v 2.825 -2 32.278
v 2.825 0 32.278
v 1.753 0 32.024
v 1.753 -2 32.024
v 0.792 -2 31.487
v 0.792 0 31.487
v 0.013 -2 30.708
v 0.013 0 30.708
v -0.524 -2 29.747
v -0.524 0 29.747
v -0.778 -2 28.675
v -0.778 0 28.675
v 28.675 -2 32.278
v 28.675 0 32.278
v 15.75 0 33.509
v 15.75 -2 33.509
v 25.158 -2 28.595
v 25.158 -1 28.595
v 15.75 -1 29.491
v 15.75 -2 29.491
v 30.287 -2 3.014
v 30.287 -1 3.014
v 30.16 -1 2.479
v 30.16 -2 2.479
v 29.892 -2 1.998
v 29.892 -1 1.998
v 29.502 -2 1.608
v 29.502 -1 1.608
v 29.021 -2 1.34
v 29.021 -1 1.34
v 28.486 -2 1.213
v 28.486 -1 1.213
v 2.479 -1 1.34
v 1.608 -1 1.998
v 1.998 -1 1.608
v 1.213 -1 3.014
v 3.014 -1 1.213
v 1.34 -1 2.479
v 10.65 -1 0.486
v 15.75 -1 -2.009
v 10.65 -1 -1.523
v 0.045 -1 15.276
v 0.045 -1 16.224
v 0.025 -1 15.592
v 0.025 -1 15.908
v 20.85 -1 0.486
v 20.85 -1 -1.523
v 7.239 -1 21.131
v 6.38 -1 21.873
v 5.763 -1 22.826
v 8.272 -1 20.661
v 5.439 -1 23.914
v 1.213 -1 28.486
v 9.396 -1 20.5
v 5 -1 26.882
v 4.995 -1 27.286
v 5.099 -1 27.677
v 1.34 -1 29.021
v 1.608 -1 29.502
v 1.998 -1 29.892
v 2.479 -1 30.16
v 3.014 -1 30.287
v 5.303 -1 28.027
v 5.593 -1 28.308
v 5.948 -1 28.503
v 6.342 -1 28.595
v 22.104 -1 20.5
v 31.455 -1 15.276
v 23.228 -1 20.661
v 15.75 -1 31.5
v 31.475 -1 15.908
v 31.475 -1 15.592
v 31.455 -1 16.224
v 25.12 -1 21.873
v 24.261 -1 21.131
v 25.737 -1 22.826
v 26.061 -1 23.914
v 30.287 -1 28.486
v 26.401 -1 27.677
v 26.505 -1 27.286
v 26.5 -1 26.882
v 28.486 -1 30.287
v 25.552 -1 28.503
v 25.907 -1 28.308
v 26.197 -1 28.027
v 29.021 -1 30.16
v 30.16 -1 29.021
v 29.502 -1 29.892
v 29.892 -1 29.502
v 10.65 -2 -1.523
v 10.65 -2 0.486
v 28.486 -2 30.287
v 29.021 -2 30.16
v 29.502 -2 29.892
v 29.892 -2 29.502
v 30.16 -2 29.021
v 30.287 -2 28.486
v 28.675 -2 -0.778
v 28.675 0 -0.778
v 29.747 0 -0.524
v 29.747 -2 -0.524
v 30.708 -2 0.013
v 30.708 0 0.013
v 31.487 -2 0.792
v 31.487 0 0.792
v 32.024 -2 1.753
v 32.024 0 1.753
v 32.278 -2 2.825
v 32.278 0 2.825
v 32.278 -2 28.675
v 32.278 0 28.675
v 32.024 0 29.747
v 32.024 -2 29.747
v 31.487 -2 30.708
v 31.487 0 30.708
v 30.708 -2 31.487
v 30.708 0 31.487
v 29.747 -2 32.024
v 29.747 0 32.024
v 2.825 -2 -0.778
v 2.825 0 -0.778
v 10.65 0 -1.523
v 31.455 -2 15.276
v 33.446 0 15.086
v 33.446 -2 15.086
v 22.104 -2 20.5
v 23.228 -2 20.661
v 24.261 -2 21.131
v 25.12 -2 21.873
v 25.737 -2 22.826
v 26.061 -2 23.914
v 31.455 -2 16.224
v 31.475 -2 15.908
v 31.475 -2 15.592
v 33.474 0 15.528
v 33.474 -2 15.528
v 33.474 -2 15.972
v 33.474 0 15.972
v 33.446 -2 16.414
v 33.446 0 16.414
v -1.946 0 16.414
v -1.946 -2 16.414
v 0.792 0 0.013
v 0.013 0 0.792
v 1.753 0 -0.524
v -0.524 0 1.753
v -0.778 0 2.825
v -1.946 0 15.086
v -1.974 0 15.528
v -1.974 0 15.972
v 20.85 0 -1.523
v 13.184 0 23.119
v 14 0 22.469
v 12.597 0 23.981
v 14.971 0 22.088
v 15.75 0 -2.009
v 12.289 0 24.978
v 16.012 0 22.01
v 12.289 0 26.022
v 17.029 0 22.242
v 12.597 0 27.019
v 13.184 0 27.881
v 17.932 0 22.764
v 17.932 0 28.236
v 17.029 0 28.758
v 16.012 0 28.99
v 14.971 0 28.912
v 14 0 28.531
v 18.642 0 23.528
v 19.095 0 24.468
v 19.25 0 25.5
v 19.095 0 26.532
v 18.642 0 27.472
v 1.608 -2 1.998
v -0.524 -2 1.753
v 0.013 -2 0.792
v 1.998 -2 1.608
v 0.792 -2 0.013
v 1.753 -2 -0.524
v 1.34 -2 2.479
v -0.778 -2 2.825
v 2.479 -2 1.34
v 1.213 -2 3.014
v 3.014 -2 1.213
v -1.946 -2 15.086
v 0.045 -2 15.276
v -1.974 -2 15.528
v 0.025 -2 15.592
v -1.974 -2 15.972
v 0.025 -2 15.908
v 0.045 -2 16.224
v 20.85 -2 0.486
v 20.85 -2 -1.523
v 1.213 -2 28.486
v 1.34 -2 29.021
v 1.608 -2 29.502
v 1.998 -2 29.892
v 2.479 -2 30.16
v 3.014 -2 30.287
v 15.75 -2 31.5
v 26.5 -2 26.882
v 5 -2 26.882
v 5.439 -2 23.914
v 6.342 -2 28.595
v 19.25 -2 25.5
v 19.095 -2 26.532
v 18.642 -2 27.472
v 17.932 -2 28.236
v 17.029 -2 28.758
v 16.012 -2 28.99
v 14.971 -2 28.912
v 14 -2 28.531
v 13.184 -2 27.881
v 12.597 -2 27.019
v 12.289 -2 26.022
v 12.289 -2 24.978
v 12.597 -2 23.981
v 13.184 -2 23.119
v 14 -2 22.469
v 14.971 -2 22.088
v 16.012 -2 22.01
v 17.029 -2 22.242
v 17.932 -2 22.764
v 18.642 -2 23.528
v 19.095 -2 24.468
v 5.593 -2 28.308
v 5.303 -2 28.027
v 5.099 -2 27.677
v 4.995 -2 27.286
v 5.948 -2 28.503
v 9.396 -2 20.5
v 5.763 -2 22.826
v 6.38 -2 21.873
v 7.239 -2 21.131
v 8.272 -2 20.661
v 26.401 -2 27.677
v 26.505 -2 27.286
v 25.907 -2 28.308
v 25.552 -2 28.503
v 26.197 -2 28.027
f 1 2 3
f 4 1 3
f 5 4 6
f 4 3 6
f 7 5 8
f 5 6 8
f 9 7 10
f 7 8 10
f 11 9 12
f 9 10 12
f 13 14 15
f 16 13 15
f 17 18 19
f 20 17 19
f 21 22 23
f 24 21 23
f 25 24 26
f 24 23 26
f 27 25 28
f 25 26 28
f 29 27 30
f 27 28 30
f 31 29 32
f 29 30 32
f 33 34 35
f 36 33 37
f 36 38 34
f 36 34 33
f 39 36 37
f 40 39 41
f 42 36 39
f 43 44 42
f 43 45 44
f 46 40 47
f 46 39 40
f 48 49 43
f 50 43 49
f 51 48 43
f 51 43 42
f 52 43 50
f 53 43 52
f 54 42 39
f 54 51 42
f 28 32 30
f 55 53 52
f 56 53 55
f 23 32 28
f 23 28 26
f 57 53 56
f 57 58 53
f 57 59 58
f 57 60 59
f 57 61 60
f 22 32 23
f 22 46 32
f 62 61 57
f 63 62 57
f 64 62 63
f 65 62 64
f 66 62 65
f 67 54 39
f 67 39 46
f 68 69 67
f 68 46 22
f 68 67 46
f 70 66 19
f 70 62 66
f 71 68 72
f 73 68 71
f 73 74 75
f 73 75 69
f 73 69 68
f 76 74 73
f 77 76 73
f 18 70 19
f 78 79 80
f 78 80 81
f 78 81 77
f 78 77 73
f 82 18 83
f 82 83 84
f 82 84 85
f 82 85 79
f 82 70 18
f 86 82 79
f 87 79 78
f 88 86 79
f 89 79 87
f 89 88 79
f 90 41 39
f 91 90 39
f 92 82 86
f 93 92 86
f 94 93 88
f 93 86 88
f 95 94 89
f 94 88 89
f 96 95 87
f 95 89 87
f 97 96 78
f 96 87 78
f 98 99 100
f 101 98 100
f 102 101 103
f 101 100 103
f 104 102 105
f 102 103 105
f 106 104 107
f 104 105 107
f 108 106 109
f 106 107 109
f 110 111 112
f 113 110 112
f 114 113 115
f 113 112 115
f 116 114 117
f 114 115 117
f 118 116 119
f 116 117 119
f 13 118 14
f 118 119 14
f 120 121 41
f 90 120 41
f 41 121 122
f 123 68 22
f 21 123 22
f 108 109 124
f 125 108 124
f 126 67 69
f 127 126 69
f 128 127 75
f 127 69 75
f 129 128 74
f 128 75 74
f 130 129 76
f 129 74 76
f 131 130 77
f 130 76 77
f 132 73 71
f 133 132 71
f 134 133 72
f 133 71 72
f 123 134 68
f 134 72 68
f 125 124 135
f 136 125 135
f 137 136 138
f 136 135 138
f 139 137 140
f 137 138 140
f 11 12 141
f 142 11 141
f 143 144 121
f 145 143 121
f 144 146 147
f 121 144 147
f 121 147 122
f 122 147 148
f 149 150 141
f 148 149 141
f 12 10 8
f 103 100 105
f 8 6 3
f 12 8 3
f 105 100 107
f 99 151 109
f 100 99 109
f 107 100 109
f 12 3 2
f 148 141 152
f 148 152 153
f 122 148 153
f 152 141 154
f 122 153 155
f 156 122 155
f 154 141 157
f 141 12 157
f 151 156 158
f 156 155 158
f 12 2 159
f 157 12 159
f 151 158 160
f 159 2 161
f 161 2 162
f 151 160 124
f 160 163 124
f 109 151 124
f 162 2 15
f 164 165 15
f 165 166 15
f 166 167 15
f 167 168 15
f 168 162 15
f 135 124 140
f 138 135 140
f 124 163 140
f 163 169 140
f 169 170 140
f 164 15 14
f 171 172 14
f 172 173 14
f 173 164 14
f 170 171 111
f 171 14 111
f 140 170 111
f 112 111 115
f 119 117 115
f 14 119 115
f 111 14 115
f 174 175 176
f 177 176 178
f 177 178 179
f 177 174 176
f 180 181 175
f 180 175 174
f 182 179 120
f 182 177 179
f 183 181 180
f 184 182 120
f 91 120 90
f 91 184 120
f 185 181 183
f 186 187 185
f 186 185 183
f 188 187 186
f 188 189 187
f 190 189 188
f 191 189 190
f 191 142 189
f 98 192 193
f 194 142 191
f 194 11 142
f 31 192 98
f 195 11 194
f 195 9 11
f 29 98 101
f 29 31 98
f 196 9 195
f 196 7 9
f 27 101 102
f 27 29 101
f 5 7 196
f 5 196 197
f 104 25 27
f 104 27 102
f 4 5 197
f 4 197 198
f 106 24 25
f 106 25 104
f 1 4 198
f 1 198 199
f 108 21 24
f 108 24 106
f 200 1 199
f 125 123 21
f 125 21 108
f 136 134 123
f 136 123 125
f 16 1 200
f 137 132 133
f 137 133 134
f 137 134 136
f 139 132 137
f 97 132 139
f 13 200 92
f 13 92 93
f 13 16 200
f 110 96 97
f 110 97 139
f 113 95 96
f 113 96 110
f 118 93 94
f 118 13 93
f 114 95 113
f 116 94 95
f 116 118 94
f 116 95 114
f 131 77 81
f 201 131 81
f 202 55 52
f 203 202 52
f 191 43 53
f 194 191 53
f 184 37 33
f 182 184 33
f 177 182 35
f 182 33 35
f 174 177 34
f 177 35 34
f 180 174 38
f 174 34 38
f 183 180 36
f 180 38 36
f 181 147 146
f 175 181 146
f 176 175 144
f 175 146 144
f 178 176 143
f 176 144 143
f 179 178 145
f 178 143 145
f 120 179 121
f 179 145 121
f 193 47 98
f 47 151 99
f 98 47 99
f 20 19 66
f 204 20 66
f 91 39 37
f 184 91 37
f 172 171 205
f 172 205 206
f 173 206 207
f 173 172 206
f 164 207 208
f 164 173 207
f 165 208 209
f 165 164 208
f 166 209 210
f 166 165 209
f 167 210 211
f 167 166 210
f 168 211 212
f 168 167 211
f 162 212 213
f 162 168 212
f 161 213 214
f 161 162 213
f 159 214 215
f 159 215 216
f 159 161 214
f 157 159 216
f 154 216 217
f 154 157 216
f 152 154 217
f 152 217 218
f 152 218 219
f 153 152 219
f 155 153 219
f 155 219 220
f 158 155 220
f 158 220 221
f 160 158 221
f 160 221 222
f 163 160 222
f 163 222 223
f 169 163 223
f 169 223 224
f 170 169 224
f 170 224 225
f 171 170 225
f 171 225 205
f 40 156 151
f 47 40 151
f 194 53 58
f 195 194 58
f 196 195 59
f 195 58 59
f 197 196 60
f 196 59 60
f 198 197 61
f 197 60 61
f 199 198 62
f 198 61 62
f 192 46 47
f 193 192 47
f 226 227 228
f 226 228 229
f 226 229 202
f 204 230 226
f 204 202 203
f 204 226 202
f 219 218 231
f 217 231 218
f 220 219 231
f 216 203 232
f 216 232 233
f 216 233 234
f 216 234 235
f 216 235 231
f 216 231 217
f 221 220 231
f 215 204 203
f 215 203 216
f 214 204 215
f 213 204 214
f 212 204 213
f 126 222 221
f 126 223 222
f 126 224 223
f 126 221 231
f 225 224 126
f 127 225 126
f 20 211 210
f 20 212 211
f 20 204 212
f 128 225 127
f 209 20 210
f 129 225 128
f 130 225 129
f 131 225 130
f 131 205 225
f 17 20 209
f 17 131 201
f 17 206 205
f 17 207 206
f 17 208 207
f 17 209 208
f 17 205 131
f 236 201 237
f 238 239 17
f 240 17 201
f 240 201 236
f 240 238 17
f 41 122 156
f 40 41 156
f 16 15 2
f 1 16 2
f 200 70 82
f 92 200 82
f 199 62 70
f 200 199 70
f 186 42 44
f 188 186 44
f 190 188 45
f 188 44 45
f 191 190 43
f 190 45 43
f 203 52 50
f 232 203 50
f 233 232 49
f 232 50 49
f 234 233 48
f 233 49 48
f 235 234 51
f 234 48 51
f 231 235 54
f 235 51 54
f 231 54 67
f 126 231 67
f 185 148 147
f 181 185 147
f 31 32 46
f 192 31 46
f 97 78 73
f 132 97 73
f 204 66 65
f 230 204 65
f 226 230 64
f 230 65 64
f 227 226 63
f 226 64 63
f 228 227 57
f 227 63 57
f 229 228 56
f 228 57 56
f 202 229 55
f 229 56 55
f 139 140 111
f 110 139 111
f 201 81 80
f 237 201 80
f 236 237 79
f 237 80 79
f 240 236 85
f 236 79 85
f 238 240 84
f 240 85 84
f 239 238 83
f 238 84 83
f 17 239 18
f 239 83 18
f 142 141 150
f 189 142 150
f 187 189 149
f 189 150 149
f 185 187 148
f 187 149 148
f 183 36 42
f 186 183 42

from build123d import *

# Parameters (mm, degrees)
F0_R     = 3.5
F1_DEPTH = 1
F2_DEPTH = 2


with BuildPart() as f1:
    # F0 (on Front) → F1 (new body)
    with BuildSketch(Plane.XZ):
        with BuildLine():
            Line((3.014297, 30.287076), (15.75, 31.5))
            Line((15.75, 31.5), (28.485703, 30.287076))
            ThreePointArc((28.485703, 30.287076), (29.710299, 29.710299), (30.287076, 28.485703))
            Line((30.287076, 28.485703), (31.454853, 16.224045))
            ThreePointArc((31.454853, 16.224045), (31.477375, 15.75), (31.454853, 15.275955))
            Line((31.454853, 15.275955), (30.287076, 3.014297))
            ThreePointArc((30.287076, 3.014297), (29.710299, 1.789701), (28.485703, 1.212924))
            Line((28.485703, 1.212924), (20.85, 0.485714))
            Line((20.85, 0.485714), (20.85, -1.523336))
            Line((20.85, -1.523336), (28.675321, -0.778067))
            ThreePointArc((28.675321, -0.778067), (31.124512, 0.375488), (32.278067, 2.824679))
            Line((32.278067, 2.824679), (33.445844, 15.086336))
            ThreePointArc((33.445844, 15.086336), (33.477375, 15.75), (33.445844, 16.413664))
            Line((33.445844, 16.413664), (32.278067, 28.675321))
            ThreePointArc((32.278067, 28.675321), (31.124512, 31.124512), (28.675321, 32.278067))
            Line((28.675321, 32.278067), (15.75, 33.50905))
            Line((15.75, 33.50905), (2.824679, 32.278067))
            ThreePointArc((2.824679, 32.278067), (0.375488, 31.124512), (-0.778067, 28.675321))
            Line((-0.778067, 28.675321), (-1.945844, 16.413664))
            ThreePointArc((-1.945844, 16.413664), (-1.977375, 15.75), (-1.945844, 15.086336))
            Line((-1.945844, 15.086336), (-0.778067, 2.824679))
            ThreePointArc((-0.778067, 2.824679), (0.375488, 0.375488), (2.824679, -0.778067))
            Line((2.824679, -0.778067), (10.65, -1.523336))
            Line((10.65, -1.523336), (10.65, 0.485714))
            Line((10.65, 0.485714), (3.014297, 1.212924))
            ThreePointArc((3.014297, 1.212924), (1.789701, 1.789701), (1.212924, 3.014297))
            Line((1.212924, 3.014297), (0.045147, 15.275955))
            ThreePointArc((0.045147, 15.275955), (0.022625, 15.75), (0.045147, 16.224045))
            Line((0.045147, 16.224045), (1.212924, 28.485703))
            ThreePointArc((1.212924, 28.485703), (1.789701, 29.710299), (3.014297, 30.287076))
        make_face()
        with BuildLine():
            Line((28.485703, 30.287076), (15.75, 31.5))
            Line((15.75, 31.5), (3.014297, 30.287076))
            ThreePointArc((3.014297, 30.287076), (1.789701, 29.710299), (1.212924, 28.485703))
            Line((1.212924, 28.485703), (0.045147, 16.224045))
            ThreePointArc((0.045147, 16.224045), (0.022625, 15.75), (0.045147, 15.275955))
            Line((0.045147, 15.275955), (1.212924, 3.014297))
            ThreePointArc((1.212924, 3.014297), (1.789701, 1.789701), (3.014297, 1.212924))
            Line((3.014297, 1.212924), (10.65, 0.485714))
            Line((10.65, 0.485714), (15.75, 0))
            Line((15.75, 0), (20.85, 0.485714))
            Line((20.85, 0.485714), (28.485703, 1.212924))
            ThreePointArc((28.485703, 1.212924), (29.710299, 1.789701), (30.287076, 3.014297))
            Line((30.287076, 3.014297), (31.454853, 15.275955))
            ThreePointArc((31.454853, 15.275955), (31.477375, 15.75), (31.454853, 16.224045))
            Line((31.454853, 16.224045), (30.287076, 28.485703))
            ThreePointArc((30.287076, 28.485703), (29.710299, 29.710299), (28.485703, 30.287076))
        make_face()
        with BuildLine():
            Line((5.439205, 23.914393), (5, 26.882069))
            ThreePointArc((5, 26.882069), (5.302961, 28.026619), (6.341624, 28.594914))
            Line((6.341624, 28.594914), (15.75, 29.49095))
            Line((15.75, 29.49095), (25.158376, 28.594914))
            ThreePointArc((25.158376, 28.594914), (26.197039, 28.026619), (26.5, 26.882069))
            Line((26.5, 26.882069), (26.060795, 23.914393))
            ThreePointArc((26.060795, 23.914393), (24.717088, 21.471599), (22.103894, 20.5))
            Line((22.103894, 20.5), (15.75, 20.5))
            Line((15.75, 20.5), (9.396106, 20.5))
            ThreePointArc((9.396106, 20.5), (6.782912, 21.471599), (5.439205, 23.914393))
        make_face(mode=Mode.SUBTRACT)
        with BuildLine():
            ThreePointArc((6.341624, 28.594914), (5.302961, 28.026619), (5, 26.882069))
            Line((5, 26.882069), (5.439205, 23.914393))
            ThreePointArc((5.439205, 23.914393), (6.782912, 21.471599), (9.396106, 20.5))
            Line((9.396106, 20.5), (15.75, 20.5))
            Line((15.75, 20.5), (22.103894, 20.5))
            ThreePointArc((22.103894, 20.5), (24.717088, 21.471599), (26.060795, 23.914393))
            Line((26.060795, 23.914393), (26.5, 26.882069))
            ThreePointArc((26.5, 26.882069), (26.197039, 28.026619), (25.158376, 28.594914))
            Line((25.158376, 28.594914), (15.75, 29.49095))
            Line((15.75, 29.49095), (6.341624, 28.594914))
        make_face()
        with Locations((15.75, 25.5)):
            Circle(F0_R, mode=Mode.SUBTRACT)
        Polygon((15.75, 0), (10.65, 0.485714), (10.65, -1.523336), (15.75, -2.00905), (20.85, -1.523336), (20.85, 0.485714), align=None)
    extrude(amount=F1_DEPTH)

    # F0 (on Front) → F2 (join)
    with BuildSketch(Plane.XZ):
        with BuildLine():
            ThreePointArc((6.341624, 28.594914), (5.302961, 28.026619), (5, 26.882069))
            Line((5, 26.882069), (5.439205, 23.914393))
            ThreePointArc((5.439205, 23.914393), (6.782912, 21.471599), (9.396106, 20.5))
            Line((9.396106, 20.5), (15.75, 20.5))
            Line((15.75, 20.5), (22.103894, 20.5))
            ThreePointArc((22.103894, 20.5), (24.717088, 21.471599), (26.060795, 23.914393))
            Line((26.060795, 23.914393), (26.5, 26.882069))
            ThreePointArc((26.5, 26.882069), (26.197039, 28.026619), (25.158376, 28.594914))
            Line((25.158376, 28.594914), (15.75, 29.49095))
            Line((15.75, 29.49095), (6.341624, 28.594914))
        make_face()
        with Locations((15.75, 25.5)):
            Circle(F0_R, mode=Mode.SUBTRACT)
        with BuildLine():
            Line((3.014297, 30.287076), (15.75, 31.5))
            Line((15.75, 31.5), (28.485703, 30.287076))
            ThreePointArc((28.485703, 30.287076), (29.710299, 29.710299), (30.287076, 28.485703))
            Line((30.287076, 28.485703), (31.454853, 16.224045))
            ThreePointArc((31.454853, 16.224045), (31.477375, 15.75), (31.454853, 15.275955))
            Line((31.454853, 15.275955), (30.287076, 3.014297))
            ThreePointArc((30.287076, 3.014297), (29.710299, 1.789701), (28.485703, 1.212924))
            Line((28.485703, 1.212924), (20.85, 0.485714))
            Line((20.85, 0.485714), (20.85, -1.523336))
            Line((20.85, -1.523336), (28.675321, -0.778067))
            ThreePointArc((28.675321, -0.778067), (31.124512, 0.375488), (32.278067, 2.824679))
            Line((32.278067, 2.824679), (33.445844, 15.086336))
            ThreePointArc((33.445844, 15.086336), (33.477375, 15.75), (33.445844, 16.413664))
            Line((33.445844, 16.413664), (32.278067, 28.675321))
            ThreePointArc((32.278067, 28.675321), (31.124512, 31.124512), (28.675321, 32.278067))
            Line((28.675321, 32.278067), (15.75, 33.50905))
            Line((15.75, 33.50905), (2.824679, 32.278067))
            ThreePointArc((2.824679, 32.278067), (0.375488, 31.124512), (-0.778067, 28.675321))
            Line((-0.778067, 28.675321), (-1.945844, 16.413664))
            ThreePointArc((-1.945844, 16.413664), (-1.977375, 15.75), (-1.945844, 15.086336))
            Line((-1.945844, 15.086336), (-0.778067, 2.824679))
            ThreePointArc((-0.778067, 2.824679), (0.375488, 0.375488), (2.824679, -0.778067))
            Line((2.824679, -0.778067), (10.65, -1.523336))
            Line((10.65, -1.523336), (10.65, 0.485714))
            Line((10.65, 0.485714), (3.014297, 1.212924))
            ThreePointArc((3.014297, 1.212924), (1.789701, 1.789701), (1.212924, 3.014297))
            Line((1.212924, 3.014297), (0.045147, 15.275955))
            ThreePointArc((0.045147, 15.275955), (0.022625, 15.75), (0.045147, 16.224045))
            Line((0.045147, 16.224045), (1.212924, 28.485703))
            ThreePointArc((1.212924, 28.485703), (1.789701, 29.710299), (3.014297, 30.287076))
        make_face()
    extrude(amount=F2_DEPTH)


solid = f1.part
